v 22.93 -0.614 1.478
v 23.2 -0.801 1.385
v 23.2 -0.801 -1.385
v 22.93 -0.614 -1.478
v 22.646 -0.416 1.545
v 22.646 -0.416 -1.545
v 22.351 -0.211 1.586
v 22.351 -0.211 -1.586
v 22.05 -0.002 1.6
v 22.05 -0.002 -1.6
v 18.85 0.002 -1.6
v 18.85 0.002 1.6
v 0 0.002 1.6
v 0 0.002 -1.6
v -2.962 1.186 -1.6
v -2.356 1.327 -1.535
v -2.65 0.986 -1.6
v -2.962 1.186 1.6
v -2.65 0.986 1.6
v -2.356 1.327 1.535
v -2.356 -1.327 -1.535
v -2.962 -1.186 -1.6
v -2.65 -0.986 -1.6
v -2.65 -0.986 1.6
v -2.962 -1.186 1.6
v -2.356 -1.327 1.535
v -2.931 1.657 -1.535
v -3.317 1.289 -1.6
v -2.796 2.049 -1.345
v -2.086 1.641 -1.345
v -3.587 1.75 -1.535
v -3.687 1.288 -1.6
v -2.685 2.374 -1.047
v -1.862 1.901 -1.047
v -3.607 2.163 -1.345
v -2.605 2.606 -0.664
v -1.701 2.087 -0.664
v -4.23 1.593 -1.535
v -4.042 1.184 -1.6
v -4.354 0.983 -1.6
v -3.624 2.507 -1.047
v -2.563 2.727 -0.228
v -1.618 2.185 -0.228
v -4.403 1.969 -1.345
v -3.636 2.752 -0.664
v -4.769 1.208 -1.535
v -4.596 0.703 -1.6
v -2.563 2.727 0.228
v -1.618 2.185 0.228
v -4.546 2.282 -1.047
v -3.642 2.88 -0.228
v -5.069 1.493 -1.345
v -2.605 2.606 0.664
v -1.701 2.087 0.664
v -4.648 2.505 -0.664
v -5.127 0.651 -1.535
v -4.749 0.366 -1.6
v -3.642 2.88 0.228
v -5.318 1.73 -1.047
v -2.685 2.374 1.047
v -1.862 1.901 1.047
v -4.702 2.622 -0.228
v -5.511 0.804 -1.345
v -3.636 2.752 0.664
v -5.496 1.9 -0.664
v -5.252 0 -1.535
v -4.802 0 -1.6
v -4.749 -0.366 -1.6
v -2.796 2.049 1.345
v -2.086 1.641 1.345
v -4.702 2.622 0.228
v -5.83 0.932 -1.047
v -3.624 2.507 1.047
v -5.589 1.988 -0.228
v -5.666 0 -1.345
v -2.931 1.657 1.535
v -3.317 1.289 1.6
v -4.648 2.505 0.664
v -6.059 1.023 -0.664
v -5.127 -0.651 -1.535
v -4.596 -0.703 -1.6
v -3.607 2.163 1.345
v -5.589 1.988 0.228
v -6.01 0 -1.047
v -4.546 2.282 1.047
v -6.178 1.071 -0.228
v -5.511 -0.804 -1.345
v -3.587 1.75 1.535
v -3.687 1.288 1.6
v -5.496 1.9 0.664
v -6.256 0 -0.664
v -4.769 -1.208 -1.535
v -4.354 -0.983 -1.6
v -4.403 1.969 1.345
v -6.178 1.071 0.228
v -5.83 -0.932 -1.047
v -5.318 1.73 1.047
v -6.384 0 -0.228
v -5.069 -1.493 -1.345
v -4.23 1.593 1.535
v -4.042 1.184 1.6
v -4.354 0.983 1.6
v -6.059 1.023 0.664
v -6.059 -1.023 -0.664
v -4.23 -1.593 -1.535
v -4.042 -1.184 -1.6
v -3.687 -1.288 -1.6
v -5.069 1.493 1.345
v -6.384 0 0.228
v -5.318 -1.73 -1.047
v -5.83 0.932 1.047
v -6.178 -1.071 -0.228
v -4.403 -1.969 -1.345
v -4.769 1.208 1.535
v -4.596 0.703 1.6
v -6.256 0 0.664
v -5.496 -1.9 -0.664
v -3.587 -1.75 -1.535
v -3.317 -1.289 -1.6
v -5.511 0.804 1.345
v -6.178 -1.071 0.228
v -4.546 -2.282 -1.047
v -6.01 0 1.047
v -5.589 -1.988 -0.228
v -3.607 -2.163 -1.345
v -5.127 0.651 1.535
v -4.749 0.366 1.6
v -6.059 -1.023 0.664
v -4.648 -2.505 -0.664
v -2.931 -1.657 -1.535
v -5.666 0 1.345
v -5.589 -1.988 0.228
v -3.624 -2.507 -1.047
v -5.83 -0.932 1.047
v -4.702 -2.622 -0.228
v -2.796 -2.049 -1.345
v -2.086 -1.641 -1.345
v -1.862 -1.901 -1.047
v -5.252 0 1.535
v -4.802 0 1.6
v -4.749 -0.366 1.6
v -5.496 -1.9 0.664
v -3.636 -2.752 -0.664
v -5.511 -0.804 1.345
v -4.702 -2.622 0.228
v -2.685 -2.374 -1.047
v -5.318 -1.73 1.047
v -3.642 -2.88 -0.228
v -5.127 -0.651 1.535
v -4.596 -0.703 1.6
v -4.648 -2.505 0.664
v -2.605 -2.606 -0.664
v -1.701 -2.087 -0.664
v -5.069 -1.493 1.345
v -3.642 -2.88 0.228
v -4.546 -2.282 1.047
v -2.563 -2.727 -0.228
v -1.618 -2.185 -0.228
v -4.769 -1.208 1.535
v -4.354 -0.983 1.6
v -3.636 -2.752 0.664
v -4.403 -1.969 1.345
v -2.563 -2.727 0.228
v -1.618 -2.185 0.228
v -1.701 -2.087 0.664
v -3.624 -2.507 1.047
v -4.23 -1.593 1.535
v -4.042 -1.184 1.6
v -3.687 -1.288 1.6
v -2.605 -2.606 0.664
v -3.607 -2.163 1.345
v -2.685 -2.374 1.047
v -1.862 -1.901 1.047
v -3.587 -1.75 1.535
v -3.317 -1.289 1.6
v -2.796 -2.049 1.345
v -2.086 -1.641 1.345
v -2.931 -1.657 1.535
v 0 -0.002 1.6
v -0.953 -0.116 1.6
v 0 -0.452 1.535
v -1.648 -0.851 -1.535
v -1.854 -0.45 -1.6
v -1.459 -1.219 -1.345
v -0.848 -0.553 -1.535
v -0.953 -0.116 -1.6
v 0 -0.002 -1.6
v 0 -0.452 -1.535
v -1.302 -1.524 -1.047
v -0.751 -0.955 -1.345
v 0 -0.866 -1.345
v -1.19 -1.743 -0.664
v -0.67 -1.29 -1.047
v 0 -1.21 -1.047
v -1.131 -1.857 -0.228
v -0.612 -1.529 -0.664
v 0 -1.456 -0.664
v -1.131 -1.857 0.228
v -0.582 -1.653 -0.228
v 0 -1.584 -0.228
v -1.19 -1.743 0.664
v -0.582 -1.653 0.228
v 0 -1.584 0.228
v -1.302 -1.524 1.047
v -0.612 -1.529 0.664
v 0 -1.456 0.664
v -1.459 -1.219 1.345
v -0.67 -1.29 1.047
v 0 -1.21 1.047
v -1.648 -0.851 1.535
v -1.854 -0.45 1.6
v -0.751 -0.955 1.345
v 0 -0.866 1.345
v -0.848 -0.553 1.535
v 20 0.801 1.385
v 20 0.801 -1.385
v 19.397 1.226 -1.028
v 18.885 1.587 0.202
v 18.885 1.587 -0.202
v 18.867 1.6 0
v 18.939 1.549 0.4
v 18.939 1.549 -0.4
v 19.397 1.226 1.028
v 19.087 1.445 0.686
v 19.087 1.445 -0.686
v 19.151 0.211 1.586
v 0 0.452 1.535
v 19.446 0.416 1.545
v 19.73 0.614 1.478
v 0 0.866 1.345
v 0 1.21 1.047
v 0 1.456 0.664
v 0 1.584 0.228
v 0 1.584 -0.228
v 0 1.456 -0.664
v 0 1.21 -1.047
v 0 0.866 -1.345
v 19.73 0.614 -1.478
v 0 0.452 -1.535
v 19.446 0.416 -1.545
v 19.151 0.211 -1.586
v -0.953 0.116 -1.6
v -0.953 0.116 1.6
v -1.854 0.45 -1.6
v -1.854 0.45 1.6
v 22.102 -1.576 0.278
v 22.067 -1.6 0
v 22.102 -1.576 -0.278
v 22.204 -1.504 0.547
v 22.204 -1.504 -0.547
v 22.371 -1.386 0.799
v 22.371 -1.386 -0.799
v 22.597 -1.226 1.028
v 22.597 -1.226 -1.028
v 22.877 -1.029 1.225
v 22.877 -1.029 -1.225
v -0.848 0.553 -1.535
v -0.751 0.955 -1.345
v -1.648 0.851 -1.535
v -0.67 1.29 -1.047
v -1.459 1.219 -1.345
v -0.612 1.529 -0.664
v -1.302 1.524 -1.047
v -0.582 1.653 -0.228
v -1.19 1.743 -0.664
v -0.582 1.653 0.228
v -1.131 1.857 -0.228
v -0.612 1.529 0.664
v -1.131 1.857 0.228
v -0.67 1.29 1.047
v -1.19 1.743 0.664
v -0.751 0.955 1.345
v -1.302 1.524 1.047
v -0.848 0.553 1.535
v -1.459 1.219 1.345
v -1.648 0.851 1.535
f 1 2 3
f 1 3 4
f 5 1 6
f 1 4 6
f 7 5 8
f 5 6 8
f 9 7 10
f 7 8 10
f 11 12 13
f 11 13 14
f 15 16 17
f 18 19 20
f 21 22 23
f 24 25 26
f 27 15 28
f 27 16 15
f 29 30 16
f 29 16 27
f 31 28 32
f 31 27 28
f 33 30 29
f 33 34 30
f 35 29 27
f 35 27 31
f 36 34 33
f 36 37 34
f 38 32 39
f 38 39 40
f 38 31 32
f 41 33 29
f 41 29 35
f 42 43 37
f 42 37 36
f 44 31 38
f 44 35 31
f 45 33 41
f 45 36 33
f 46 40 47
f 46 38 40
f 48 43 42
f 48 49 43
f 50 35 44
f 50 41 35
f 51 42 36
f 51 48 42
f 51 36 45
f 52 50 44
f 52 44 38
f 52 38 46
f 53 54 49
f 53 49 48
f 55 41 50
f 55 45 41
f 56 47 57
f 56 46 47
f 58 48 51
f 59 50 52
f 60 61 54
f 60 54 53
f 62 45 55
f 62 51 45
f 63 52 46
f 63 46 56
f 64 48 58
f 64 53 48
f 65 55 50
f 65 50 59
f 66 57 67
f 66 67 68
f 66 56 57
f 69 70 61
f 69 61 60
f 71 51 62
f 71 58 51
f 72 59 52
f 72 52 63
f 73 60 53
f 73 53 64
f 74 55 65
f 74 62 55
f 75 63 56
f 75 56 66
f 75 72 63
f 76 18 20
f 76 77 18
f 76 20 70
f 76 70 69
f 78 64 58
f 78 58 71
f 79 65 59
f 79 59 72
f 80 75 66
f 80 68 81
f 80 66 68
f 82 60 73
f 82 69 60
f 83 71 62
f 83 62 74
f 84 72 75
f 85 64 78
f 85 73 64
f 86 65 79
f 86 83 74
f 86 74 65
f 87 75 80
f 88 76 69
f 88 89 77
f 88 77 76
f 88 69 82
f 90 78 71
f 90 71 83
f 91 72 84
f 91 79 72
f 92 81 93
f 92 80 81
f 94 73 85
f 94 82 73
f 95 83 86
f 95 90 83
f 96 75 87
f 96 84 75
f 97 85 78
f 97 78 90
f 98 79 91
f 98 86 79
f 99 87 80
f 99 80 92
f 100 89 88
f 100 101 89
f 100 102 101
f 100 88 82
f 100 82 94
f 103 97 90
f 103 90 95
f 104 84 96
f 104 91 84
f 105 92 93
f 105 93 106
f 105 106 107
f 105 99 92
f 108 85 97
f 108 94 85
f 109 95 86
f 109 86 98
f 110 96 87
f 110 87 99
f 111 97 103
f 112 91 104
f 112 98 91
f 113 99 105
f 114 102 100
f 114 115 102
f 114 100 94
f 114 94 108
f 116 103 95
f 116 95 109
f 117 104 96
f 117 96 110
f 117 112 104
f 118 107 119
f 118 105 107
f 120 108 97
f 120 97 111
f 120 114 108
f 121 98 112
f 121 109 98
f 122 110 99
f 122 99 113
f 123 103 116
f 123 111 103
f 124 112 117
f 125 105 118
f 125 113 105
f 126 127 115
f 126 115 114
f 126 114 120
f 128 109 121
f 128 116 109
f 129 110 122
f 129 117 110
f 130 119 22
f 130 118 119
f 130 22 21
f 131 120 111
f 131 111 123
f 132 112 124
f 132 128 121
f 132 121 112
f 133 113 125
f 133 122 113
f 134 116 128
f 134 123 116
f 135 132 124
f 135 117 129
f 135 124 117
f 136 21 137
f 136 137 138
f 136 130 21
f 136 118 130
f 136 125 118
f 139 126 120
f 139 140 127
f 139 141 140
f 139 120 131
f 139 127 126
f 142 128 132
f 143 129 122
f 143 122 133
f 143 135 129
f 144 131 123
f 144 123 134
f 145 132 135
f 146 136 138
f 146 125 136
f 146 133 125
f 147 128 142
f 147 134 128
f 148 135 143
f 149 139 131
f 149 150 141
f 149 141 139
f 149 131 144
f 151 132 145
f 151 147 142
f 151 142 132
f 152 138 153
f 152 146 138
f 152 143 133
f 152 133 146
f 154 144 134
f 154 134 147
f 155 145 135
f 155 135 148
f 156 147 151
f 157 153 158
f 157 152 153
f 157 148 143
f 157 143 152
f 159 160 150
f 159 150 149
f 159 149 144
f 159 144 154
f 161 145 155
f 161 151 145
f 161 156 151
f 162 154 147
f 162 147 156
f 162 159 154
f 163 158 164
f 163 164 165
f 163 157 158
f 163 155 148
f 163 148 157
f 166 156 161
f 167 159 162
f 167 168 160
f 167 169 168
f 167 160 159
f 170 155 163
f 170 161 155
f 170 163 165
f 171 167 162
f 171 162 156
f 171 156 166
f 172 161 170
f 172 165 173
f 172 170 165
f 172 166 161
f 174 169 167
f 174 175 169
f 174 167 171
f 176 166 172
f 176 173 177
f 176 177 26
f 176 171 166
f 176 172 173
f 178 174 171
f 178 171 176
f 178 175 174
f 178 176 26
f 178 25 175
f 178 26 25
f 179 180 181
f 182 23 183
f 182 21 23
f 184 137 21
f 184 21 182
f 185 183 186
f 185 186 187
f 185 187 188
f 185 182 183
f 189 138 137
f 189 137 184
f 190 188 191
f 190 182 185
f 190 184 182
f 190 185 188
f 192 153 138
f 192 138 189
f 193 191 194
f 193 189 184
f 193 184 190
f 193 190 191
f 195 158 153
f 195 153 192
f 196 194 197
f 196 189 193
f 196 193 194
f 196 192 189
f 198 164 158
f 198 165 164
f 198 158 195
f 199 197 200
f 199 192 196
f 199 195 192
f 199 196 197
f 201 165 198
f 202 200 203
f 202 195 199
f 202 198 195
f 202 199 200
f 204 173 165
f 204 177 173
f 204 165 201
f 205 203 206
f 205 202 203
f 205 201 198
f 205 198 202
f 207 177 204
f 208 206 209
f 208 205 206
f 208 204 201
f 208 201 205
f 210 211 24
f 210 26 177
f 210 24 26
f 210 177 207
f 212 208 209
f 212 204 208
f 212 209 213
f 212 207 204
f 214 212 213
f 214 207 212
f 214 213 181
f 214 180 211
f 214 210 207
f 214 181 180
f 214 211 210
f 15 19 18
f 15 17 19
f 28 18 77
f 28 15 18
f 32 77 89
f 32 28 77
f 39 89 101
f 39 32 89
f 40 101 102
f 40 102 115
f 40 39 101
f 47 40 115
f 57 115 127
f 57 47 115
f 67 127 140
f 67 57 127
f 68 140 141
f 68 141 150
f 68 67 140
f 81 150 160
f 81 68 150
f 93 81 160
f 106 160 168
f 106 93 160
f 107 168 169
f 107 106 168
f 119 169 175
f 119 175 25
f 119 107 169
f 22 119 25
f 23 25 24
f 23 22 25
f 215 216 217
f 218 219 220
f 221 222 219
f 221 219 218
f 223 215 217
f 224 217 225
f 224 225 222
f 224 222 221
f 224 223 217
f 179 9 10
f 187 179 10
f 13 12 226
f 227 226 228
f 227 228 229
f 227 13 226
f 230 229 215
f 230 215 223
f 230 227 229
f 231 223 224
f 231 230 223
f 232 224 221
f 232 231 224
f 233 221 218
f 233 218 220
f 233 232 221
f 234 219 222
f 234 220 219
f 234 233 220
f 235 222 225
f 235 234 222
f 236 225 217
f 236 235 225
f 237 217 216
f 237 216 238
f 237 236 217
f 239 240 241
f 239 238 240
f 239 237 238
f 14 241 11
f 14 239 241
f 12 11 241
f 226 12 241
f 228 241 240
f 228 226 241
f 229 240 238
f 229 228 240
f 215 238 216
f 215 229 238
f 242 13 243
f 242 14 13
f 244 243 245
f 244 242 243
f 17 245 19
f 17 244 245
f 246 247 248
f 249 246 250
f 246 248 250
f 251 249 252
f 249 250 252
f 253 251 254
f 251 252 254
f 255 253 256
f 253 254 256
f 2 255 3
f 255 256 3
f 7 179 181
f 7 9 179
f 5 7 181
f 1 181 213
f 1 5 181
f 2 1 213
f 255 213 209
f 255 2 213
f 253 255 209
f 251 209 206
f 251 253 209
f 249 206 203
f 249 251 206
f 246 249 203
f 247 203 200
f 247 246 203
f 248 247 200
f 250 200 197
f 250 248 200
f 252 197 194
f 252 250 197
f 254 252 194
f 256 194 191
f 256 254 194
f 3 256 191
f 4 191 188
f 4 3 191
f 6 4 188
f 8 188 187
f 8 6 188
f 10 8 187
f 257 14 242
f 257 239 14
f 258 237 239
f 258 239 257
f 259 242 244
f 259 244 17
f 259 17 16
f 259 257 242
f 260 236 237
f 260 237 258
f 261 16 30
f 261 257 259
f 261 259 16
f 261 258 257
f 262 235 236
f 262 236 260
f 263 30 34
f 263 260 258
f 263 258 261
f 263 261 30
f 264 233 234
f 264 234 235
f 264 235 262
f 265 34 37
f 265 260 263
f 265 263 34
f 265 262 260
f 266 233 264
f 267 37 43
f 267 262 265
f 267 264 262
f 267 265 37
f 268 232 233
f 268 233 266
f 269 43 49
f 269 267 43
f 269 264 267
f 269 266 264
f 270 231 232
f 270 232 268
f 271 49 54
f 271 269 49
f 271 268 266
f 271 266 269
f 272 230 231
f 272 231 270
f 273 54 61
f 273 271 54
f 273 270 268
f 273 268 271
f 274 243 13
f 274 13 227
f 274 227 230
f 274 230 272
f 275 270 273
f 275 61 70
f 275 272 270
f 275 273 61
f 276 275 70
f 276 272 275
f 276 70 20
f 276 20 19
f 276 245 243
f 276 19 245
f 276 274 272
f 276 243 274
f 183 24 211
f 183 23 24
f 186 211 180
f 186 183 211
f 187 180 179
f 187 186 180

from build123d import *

# Parameters (mm, degrees)
CONECUT_DEPTH      = 2.59999885
CONECUT_DEPTH_BACK = 2.59999885


with BuildPart() as part:
    # Body: sweep along a path in 草图2
    with BuildLine(Plane.XY) as body_path:
        Line((20, 1.6), (0, 1.6))
        ThreePointArc((0, 1.6), (-0.857074534, 1.7540301), (-1.606886657, 2.196843615))
        ThreePointArc((-1.606886657, 2.196843615), (-6.4, 0), (-1.606886657, -2.196843615))
        ThreePointArc((-1.606886657, -2.196843615), (-0.857074534, -1.7540301), (0, -1.6))
        Line((0, -1.6), (23.2, -1.6))
    # 草图1 → Body (sweep)
    with BuildSketch(Plane(origin=(20, 0, 0), x_dir=(0, 0, -1), z_dir=(1, 0, 0))):
        with BuildLine():
            Line((-1.59999875, 0.002), (1.59999875, 0.002))
            ThreePointArc((1.59999875, 0.002), (0, 1.6), (-1.59999875, 0.002))
        make_face()
    sweep(path=body_path.line)

    # 草图3 → ConeCut (cut, two sides)
    with BuildSketch(Plane.XY) as conecut_sk:
        Polygon((20, 0.801), (18.853141685, 1.61), (23.21, 1.61), (23.21, -1.61), (22.053141685, -1.61), (23.2, -0.801), (22.047540024, 0), (18.847540024, 0), align=None)
    extrude(amount=CONECUT_DEPTH, mode=Mode.SUBTRACT)
    extrude(conecut_sk.sketch, amount=-CONECUT_DEPTH_BACK, mode=Mode.SUBTRACT)


solid = part.part
